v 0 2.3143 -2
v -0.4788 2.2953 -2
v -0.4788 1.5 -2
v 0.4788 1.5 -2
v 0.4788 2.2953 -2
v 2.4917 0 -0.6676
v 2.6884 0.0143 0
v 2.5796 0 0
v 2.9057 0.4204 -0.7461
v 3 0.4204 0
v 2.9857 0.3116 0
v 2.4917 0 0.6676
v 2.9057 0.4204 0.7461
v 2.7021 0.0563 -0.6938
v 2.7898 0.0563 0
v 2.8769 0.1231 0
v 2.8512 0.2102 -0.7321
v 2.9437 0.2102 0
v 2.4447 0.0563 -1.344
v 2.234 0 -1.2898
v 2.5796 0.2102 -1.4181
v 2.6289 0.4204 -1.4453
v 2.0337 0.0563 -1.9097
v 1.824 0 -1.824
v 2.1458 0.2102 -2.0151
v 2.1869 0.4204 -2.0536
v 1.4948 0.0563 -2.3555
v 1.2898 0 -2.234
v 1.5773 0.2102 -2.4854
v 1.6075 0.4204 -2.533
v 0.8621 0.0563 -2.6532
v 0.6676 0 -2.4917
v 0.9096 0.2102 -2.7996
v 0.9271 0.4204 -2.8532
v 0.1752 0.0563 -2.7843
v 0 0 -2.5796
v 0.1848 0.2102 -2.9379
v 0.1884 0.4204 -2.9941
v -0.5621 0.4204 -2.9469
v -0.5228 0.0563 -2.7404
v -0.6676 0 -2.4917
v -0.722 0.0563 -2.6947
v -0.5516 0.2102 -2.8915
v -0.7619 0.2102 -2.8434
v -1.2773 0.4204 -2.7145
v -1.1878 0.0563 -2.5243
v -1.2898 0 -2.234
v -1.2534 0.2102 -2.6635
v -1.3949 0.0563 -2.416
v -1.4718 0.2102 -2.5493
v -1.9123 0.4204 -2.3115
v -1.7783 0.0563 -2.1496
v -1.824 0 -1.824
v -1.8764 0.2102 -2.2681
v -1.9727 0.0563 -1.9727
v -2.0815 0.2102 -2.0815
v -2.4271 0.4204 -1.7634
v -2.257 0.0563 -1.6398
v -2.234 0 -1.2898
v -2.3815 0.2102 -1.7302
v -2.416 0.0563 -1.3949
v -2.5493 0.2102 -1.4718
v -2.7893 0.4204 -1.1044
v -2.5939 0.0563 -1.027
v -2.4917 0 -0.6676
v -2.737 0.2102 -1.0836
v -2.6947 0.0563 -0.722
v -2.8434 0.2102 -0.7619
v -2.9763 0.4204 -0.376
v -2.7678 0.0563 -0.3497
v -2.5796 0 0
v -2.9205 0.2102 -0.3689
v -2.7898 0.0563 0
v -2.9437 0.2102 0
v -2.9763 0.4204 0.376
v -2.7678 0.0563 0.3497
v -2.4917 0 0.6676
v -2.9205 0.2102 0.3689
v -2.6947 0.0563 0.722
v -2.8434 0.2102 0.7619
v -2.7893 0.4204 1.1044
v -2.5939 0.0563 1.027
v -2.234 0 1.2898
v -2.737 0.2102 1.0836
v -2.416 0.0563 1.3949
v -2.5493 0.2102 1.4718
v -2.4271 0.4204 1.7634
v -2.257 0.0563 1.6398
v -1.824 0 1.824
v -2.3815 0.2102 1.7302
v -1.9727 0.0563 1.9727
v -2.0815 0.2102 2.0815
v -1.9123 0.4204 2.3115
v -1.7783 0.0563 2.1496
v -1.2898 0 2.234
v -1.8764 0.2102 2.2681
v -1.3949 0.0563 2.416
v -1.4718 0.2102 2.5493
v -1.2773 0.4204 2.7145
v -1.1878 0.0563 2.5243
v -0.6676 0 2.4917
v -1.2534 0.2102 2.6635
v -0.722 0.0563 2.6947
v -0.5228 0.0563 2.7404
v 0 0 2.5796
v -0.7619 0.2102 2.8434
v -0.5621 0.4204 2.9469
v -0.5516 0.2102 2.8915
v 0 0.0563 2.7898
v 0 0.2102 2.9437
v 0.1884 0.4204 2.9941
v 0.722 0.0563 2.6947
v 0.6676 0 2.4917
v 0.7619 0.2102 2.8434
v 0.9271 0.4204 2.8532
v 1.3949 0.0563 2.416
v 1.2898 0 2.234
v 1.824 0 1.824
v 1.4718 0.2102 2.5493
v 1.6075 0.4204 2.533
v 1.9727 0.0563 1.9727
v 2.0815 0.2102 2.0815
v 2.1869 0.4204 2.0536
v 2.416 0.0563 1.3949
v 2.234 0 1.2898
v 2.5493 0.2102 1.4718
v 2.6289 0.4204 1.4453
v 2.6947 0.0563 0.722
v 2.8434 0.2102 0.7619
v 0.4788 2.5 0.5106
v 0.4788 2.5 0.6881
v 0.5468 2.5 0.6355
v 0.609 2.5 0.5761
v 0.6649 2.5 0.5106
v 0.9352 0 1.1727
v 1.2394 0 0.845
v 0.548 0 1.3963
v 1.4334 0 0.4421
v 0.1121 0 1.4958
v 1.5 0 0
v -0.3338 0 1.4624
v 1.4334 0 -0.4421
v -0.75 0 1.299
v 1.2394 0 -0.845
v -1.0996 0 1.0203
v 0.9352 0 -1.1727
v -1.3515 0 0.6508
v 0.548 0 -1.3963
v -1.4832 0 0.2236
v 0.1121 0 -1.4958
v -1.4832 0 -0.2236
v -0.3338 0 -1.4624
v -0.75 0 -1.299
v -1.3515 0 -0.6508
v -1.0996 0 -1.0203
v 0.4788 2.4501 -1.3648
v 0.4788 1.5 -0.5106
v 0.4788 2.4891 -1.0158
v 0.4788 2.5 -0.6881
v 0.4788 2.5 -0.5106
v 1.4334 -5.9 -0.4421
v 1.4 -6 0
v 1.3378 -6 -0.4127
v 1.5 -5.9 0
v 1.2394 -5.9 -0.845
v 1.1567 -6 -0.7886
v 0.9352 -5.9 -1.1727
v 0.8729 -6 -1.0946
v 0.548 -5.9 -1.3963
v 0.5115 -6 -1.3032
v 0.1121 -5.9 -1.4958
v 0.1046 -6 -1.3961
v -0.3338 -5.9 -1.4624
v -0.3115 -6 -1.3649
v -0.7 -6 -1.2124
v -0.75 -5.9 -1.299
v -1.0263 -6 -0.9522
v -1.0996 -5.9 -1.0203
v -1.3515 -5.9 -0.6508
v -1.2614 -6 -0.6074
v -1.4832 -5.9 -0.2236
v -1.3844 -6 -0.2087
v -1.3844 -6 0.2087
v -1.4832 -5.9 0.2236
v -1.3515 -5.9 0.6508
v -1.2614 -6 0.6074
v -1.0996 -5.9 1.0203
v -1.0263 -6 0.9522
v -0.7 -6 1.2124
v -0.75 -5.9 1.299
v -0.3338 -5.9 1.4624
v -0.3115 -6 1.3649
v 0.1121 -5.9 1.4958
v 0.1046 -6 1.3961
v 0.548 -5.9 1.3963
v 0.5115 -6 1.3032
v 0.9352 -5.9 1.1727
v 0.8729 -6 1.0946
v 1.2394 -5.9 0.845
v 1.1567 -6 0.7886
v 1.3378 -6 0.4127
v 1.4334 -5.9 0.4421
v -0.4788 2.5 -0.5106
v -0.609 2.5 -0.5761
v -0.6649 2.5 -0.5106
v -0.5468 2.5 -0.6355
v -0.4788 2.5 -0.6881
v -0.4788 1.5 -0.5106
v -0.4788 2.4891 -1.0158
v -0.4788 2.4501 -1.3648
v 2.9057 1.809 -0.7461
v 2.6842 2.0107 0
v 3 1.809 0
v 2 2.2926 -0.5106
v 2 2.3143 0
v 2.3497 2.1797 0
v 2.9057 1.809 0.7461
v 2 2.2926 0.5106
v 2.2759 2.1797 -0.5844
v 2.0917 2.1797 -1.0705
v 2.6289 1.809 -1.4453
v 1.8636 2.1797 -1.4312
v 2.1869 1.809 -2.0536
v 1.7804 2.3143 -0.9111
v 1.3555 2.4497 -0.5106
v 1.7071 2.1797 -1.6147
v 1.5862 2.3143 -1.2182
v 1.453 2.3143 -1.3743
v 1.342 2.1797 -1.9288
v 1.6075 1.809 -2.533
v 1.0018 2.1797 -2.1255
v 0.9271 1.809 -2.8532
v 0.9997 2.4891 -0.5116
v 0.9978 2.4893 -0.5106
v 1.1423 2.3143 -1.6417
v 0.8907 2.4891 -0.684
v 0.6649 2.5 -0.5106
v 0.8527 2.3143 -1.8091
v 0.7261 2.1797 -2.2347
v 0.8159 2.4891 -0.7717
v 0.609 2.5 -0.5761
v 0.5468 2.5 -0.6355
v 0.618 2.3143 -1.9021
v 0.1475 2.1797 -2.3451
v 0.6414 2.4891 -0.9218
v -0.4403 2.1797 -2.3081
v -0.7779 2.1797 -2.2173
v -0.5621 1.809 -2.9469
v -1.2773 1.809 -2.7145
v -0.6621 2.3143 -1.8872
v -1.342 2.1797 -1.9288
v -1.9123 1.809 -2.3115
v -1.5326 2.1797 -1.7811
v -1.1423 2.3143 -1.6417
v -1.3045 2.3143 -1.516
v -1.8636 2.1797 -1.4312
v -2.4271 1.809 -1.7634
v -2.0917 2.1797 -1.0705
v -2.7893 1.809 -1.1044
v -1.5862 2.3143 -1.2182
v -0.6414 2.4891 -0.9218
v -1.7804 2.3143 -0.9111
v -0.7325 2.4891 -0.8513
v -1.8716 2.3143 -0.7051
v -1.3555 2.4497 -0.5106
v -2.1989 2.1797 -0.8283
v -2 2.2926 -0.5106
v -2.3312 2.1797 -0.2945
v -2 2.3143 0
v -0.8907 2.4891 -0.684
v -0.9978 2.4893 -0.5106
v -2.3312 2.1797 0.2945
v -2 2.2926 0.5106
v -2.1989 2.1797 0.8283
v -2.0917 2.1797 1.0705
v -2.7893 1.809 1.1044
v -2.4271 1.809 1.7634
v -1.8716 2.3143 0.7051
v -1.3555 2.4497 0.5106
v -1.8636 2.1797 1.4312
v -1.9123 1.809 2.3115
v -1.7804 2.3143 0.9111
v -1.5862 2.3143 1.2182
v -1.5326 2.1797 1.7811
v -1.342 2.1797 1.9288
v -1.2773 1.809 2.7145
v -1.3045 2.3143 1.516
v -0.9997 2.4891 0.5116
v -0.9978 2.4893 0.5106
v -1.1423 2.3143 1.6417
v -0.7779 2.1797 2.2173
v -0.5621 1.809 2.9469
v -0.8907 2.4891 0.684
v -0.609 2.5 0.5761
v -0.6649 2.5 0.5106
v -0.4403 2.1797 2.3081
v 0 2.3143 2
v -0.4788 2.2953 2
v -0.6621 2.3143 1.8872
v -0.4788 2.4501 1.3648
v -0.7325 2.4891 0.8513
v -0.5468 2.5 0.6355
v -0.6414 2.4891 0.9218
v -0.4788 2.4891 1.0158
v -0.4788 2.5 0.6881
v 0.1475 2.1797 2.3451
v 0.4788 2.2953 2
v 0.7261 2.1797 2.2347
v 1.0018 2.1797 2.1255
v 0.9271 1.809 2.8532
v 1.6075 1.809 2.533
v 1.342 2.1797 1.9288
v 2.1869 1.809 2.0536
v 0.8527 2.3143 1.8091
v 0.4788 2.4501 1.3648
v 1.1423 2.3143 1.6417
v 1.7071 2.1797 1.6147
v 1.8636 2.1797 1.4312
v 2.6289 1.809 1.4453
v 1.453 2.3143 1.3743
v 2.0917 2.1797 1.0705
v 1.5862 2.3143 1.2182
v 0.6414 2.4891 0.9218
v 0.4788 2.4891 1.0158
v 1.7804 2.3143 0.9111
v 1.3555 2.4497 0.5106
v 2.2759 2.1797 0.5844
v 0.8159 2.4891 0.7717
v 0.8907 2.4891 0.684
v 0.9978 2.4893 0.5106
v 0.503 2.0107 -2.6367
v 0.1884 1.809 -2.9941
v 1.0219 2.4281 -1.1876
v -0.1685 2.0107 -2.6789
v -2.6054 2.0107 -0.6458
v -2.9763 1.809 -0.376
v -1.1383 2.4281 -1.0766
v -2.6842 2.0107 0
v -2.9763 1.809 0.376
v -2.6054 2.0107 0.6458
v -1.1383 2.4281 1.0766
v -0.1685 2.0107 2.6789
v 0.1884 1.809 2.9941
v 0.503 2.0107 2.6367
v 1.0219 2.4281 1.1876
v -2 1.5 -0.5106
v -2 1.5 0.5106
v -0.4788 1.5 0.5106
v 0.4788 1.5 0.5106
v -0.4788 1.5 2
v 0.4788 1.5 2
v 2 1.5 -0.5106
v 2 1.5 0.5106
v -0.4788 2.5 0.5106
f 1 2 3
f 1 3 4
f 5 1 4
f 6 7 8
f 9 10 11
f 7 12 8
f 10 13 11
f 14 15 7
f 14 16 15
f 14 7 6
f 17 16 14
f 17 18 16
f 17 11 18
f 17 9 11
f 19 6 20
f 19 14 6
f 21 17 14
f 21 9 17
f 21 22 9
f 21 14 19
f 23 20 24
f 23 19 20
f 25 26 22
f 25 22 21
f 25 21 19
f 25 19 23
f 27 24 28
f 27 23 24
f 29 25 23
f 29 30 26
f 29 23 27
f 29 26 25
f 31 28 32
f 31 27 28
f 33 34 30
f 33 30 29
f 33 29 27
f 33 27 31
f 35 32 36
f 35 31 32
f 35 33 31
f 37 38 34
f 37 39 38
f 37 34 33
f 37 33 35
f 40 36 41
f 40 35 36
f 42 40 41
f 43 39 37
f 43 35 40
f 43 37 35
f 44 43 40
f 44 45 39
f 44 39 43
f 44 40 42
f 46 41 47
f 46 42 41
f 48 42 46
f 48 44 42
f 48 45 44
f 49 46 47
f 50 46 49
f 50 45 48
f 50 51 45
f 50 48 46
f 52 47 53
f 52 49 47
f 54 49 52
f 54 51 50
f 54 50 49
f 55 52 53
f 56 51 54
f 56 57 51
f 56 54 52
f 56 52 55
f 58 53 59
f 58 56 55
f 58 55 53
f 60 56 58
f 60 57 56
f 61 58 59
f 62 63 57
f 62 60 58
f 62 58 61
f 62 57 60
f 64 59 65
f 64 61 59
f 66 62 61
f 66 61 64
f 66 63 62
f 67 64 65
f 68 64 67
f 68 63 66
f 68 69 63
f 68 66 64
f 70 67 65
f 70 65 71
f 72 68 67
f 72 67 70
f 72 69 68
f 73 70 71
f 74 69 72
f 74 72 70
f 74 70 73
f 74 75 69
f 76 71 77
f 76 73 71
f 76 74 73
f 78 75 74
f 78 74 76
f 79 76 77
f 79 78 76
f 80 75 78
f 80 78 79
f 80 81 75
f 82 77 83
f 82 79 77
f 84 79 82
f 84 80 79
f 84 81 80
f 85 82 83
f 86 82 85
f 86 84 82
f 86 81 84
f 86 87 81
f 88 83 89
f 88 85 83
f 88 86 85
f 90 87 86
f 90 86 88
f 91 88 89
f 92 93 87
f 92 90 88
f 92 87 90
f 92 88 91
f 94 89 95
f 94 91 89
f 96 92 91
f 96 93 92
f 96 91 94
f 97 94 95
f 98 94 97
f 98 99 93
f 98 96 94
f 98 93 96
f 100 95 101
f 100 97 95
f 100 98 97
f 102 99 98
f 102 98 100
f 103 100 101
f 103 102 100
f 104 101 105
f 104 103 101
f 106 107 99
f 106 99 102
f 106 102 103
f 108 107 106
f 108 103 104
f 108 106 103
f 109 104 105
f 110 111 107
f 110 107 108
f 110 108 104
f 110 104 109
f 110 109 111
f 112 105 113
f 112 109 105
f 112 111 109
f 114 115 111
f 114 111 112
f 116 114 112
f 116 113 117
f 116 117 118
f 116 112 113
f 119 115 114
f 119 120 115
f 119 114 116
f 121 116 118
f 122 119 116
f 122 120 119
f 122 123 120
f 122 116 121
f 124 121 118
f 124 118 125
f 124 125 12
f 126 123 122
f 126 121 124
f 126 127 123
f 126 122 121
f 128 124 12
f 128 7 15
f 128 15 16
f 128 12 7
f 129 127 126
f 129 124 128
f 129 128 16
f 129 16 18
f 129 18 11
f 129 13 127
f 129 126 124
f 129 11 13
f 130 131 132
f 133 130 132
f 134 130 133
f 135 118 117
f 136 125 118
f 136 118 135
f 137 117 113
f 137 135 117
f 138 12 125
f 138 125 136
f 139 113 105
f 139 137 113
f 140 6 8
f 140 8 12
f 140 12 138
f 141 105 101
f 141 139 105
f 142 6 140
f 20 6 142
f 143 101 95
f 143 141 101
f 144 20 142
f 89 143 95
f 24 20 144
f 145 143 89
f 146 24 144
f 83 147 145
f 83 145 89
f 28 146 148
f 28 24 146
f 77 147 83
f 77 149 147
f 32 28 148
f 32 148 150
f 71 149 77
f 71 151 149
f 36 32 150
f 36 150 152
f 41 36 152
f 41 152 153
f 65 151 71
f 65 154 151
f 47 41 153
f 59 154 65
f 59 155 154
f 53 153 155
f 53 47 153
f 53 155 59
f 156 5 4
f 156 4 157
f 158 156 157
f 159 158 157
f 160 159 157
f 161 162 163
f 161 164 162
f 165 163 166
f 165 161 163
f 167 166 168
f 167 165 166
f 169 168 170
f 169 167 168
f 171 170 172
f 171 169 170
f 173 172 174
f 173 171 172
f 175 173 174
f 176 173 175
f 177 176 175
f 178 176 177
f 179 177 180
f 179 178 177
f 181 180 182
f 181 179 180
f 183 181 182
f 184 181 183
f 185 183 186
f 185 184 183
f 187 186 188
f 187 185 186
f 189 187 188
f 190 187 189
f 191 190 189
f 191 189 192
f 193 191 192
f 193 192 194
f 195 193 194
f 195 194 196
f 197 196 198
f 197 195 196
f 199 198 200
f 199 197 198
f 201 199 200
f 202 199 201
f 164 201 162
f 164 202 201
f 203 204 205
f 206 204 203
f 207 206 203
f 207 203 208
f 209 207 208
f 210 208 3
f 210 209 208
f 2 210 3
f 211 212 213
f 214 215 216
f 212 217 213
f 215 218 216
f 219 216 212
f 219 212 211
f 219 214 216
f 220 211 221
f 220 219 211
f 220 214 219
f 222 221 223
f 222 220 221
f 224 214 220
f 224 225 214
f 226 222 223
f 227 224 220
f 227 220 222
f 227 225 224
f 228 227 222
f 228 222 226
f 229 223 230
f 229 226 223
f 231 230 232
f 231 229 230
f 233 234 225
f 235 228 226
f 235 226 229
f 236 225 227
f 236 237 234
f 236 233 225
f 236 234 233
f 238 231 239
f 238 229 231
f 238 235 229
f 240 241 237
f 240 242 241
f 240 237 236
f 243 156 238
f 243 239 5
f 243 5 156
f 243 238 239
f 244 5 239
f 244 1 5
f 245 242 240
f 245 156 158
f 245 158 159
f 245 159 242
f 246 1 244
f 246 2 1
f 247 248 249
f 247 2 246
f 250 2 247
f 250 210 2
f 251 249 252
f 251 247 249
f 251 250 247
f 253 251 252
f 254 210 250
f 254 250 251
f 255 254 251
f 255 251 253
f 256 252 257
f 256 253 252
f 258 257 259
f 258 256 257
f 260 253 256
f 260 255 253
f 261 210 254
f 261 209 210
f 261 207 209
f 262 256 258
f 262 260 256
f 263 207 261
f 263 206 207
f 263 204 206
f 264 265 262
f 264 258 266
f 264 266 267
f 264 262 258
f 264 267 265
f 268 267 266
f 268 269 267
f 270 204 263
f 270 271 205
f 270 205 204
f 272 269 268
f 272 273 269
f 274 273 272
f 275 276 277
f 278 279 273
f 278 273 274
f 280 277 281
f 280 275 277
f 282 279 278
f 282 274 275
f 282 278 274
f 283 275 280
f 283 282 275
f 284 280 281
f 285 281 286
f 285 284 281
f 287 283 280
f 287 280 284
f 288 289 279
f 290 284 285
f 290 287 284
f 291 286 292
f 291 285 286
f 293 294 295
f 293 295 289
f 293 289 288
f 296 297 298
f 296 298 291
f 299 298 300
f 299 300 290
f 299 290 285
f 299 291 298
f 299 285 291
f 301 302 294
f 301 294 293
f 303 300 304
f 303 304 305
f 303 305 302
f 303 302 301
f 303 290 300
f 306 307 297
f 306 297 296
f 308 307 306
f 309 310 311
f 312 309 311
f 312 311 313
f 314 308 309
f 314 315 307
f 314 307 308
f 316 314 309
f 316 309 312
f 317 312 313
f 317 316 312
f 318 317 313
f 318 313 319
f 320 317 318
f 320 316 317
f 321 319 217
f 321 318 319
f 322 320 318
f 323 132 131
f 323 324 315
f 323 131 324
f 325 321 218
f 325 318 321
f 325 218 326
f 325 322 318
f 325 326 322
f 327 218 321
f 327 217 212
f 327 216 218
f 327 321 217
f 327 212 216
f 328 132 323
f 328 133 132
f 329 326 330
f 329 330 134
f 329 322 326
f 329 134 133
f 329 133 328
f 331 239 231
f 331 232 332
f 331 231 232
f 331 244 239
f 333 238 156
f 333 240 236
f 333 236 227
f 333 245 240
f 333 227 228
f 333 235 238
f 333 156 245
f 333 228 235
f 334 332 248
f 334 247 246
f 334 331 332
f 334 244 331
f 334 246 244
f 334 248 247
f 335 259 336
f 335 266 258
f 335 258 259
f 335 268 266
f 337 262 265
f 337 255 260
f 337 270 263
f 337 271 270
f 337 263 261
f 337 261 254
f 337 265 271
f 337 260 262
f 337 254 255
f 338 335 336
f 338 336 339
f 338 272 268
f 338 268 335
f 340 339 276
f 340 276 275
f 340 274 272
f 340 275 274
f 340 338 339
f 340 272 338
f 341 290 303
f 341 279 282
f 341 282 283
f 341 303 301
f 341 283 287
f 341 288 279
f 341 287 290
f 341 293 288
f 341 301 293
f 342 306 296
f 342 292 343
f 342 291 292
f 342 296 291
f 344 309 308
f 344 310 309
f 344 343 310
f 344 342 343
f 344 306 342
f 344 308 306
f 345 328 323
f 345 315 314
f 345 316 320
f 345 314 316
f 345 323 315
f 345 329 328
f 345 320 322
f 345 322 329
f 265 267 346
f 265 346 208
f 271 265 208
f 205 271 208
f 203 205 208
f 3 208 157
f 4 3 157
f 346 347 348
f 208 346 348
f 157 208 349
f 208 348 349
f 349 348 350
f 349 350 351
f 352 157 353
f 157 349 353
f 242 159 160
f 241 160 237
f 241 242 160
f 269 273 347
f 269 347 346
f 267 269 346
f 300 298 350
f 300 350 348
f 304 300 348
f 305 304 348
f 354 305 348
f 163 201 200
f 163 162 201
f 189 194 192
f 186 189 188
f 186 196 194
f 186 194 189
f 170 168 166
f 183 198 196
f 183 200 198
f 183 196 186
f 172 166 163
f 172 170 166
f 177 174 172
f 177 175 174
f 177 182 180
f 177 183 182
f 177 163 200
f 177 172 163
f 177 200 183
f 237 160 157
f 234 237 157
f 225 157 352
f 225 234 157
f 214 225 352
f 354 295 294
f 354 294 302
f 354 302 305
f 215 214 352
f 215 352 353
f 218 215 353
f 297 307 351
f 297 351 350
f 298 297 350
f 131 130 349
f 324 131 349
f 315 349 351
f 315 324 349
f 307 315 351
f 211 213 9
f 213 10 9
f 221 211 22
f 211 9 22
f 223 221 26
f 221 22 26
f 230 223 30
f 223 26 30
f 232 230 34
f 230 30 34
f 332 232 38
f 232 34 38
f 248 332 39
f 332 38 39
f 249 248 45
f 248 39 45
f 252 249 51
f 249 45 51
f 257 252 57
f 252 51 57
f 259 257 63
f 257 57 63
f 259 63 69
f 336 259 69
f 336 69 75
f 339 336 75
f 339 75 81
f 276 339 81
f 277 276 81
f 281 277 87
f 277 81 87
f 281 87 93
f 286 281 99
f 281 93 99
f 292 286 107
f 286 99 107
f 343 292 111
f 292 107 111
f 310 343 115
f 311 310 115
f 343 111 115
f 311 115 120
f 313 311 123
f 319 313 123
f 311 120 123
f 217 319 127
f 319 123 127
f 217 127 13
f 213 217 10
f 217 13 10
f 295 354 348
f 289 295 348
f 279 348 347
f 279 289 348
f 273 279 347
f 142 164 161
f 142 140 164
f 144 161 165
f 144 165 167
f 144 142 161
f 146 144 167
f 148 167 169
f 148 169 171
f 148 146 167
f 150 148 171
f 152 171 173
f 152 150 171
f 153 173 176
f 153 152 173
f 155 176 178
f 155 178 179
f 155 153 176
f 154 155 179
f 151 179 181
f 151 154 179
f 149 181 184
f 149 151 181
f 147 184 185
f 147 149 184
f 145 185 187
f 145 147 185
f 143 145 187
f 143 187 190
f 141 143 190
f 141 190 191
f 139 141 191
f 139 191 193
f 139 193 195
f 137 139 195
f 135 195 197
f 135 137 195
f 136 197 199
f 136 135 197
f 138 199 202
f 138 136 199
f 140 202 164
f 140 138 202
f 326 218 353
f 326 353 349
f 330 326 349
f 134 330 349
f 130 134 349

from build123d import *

# Parameters (mm, degrees)
POCKET_DEPTH = 1


with BuildPart() as part:
    # Sketch → Revolution (revolve)
    with BuildSketch(Plane.XY):
        with BuildLine():
            Line((0, -6), (1.4, -6))
            Line((1.4, -6), (1.5, -5.9))
            Line((1.5, -5.9), (1.5, 0))
            Line((1.5, 0), (2.579564, 0))
            ThreePointArc((2.579564, 0), (2.876857, 0.123143), (3, 0.420436))
            Line((3, 1.808972), (3, 0.420436))
            ThreePointArc((3, 1.808972), (1.973047, 2.323042), (0.838329, 2.5))
            Line((0.838329, 2.5), (0, 2.5))
            Line((0, 2.5), (0, -6))
        make_face()
    revolve(axis=Axis((0, 0, 0), (0, 1, 0)))

    # Sketch001 (on Face2 of Revolution) → Pocket (cut)
    with BuildSketch(Plane(origin=(0, 2.5, 0), x_dir=(-1, 0, 0), z_dir=(0, 1, 0))):
        Polygon((-0.478807, 2), (0.478807, 2), (0.478807, 0.510631), (2, 0.510631), (2, -0.510631), (0.478807, -0.510631), (0.478807, -2), (-0.478807, -2), (-0.478807, -0.510631), (-2, -0.510631), (-2, 0.510631), (-0.478807, 0.510631), align=None)
    extrude(amount=-POCKET_DEPTH, mode=Mode.SUBTRACT)


solid = part.part
